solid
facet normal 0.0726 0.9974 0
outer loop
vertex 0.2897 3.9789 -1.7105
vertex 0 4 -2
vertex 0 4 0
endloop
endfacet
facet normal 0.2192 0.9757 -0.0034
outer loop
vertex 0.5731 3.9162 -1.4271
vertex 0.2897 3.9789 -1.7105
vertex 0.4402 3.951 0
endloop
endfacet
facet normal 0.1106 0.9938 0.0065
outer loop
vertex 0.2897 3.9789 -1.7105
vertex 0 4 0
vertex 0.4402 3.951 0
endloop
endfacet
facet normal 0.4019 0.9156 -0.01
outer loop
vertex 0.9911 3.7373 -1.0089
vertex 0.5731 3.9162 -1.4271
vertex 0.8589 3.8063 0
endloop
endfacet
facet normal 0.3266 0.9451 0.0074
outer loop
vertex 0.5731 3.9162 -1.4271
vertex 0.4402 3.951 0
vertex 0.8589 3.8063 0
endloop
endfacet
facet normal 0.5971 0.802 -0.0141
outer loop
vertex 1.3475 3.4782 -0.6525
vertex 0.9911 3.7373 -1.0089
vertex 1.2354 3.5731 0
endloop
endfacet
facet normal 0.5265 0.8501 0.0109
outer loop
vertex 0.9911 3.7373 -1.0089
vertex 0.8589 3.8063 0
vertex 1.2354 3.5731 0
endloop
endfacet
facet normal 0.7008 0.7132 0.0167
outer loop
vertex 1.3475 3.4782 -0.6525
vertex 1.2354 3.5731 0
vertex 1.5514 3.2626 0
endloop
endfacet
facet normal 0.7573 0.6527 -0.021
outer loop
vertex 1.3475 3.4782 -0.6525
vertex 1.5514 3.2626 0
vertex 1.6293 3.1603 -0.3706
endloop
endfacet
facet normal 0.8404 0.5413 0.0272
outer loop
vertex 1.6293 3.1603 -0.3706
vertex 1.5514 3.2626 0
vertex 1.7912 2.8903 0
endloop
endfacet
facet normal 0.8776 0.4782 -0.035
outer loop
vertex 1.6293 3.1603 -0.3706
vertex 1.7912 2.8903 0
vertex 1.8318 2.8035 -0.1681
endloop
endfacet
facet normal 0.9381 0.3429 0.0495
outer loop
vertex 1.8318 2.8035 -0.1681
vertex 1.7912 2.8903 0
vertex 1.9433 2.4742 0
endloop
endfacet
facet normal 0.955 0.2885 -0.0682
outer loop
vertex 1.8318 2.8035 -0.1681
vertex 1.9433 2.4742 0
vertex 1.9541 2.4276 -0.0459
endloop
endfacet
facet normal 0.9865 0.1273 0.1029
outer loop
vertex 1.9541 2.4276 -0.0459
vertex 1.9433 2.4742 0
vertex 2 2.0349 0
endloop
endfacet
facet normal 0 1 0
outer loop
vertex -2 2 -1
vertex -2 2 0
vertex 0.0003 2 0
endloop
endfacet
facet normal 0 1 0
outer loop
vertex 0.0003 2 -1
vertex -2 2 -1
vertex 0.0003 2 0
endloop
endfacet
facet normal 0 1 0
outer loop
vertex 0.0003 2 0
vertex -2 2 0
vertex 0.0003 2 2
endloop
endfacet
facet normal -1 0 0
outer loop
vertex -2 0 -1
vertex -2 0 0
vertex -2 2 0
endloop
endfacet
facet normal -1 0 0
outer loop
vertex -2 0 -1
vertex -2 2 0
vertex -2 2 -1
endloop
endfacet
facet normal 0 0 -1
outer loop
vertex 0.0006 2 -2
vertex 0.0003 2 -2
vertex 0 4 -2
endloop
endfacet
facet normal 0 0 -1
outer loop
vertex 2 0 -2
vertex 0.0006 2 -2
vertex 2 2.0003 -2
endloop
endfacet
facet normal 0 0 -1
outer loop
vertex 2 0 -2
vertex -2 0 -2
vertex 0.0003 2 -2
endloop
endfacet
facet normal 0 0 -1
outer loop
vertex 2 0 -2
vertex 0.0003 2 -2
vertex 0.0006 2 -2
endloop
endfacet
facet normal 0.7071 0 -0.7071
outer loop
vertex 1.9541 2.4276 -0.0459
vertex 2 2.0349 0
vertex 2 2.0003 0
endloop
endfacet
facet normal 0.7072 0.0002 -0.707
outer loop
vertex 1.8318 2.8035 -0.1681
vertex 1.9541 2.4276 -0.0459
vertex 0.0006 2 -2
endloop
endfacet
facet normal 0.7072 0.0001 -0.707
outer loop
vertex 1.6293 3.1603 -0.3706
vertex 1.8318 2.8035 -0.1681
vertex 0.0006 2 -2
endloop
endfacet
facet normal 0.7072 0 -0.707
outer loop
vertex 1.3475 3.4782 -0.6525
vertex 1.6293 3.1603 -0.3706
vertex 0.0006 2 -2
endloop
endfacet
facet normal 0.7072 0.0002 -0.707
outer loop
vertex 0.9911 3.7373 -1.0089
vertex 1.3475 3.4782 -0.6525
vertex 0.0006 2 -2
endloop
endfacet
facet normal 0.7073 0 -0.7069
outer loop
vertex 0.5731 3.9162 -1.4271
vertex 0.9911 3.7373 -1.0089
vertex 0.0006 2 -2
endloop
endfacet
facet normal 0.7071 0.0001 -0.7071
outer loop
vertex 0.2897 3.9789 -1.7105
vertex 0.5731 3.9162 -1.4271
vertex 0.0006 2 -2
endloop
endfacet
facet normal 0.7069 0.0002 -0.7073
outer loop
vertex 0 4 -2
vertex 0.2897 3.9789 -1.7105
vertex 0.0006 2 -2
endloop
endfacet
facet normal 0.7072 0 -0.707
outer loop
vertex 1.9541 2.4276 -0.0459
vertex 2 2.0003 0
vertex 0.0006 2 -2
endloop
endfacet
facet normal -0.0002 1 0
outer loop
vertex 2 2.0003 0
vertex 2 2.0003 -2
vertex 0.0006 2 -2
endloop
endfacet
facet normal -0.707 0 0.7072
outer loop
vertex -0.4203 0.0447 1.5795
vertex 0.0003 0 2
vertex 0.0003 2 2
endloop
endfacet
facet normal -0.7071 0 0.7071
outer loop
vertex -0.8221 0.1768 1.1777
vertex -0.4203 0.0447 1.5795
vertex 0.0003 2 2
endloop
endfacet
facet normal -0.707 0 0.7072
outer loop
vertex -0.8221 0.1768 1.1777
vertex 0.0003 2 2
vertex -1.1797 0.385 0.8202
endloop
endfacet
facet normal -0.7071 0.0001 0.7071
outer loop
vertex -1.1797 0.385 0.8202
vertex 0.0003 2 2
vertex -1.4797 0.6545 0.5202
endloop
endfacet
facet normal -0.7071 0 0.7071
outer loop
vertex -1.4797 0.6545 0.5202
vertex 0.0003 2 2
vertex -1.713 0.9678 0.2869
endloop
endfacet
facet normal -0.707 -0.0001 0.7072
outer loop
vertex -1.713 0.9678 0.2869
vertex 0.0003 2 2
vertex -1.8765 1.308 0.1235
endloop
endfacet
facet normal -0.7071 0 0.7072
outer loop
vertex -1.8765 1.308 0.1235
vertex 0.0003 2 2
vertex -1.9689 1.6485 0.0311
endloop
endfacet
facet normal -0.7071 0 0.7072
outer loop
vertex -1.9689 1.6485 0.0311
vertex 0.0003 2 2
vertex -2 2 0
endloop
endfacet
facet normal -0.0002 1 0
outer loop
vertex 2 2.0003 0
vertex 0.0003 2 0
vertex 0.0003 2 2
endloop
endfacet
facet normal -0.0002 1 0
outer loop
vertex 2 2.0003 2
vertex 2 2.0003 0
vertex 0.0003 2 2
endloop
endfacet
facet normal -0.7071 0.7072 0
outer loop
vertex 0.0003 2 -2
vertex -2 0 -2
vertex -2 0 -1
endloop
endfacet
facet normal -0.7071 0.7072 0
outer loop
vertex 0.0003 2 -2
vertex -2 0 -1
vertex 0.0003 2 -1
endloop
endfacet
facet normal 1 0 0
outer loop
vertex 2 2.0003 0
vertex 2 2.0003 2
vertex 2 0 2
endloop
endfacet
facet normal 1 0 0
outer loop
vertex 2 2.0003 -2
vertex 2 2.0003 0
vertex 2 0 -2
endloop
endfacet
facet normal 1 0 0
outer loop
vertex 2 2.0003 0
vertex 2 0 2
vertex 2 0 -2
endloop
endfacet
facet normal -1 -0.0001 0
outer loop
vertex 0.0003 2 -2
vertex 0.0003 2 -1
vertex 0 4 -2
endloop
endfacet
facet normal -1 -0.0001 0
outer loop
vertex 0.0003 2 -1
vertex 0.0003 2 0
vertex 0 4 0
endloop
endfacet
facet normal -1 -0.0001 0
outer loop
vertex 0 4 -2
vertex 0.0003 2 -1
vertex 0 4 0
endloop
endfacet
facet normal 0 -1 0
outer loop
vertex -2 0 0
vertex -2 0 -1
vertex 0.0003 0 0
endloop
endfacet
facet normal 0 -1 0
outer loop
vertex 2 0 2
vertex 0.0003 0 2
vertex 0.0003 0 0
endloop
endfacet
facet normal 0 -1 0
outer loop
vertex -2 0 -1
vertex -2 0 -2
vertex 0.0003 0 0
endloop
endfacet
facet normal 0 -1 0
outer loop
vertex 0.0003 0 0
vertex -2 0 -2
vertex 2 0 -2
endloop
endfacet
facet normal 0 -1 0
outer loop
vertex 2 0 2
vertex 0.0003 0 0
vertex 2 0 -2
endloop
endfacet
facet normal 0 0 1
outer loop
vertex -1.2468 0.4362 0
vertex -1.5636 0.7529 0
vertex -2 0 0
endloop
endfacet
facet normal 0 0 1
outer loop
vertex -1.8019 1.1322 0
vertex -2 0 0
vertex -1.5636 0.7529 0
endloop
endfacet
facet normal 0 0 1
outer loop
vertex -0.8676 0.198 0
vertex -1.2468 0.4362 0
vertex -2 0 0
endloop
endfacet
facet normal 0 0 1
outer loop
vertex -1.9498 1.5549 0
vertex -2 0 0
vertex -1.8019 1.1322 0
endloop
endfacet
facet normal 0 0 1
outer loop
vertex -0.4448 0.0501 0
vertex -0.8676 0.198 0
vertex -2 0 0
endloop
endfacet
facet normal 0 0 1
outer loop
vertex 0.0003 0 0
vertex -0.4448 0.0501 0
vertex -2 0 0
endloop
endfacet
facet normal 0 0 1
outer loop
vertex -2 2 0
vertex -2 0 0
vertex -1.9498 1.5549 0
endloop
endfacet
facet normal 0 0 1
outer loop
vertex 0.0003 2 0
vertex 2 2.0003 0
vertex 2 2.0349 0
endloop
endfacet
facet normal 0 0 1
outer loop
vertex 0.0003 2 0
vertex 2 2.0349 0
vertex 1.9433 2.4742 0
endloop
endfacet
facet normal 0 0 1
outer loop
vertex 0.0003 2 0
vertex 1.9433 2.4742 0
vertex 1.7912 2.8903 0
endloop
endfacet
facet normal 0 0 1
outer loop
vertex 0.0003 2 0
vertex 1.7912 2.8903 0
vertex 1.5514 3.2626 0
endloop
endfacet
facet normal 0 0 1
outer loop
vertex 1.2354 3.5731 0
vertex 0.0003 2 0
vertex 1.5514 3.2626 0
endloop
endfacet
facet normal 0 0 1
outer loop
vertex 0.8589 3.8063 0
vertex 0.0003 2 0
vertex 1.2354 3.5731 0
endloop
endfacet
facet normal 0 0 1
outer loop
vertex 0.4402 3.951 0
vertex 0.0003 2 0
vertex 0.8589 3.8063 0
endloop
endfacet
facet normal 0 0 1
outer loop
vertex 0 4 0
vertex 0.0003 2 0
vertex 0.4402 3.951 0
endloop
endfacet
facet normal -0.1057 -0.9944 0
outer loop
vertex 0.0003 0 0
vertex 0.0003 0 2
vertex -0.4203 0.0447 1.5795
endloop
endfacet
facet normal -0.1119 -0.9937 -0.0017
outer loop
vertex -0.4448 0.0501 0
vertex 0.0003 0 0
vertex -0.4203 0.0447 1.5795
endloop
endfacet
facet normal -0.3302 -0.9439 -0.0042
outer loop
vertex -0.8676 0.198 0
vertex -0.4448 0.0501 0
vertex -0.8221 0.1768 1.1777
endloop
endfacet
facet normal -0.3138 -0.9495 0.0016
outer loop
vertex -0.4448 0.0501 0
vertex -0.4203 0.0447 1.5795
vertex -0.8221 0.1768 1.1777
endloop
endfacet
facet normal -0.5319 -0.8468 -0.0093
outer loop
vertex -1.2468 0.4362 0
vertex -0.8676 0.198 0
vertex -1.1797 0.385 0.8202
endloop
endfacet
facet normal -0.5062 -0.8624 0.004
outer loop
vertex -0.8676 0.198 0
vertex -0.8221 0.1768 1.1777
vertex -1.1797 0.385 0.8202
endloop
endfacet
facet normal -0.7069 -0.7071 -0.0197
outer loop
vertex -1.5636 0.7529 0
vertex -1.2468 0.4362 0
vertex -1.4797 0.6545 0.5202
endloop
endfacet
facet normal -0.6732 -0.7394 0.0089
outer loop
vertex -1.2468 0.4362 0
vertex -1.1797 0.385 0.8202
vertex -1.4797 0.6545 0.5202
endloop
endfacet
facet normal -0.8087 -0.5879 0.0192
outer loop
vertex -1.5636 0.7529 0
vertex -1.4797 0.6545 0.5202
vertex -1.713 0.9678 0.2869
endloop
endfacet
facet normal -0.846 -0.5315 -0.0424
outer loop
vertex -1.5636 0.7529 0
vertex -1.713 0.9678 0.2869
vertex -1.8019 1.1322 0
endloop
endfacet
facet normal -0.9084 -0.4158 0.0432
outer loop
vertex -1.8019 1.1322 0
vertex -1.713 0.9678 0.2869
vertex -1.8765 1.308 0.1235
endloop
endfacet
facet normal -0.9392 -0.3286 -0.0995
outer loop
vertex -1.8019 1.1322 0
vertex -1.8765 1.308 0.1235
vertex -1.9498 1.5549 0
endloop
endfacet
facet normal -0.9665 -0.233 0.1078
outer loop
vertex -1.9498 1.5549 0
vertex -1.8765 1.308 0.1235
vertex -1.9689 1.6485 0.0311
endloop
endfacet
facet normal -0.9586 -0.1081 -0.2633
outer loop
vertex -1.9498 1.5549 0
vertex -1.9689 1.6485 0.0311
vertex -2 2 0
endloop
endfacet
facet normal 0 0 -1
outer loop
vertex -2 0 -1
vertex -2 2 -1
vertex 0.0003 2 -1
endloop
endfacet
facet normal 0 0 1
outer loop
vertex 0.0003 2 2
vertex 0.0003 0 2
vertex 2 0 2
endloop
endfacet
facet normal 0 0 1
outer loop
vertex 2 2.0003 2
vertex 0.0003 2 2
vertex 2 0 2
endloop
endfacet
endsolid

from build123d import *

# Parameters (mm, degrees)
SKETCH1_W           = 4
SKETCH1_H           = 4
BOSS_EXTRUDE1_DEPTH = 4
CUT_EXTRUDE1_DEPTH  = 4
CUT_EXTRUDE2_DEPTH  = 4
SKETCH4_W           = 2
SKETCH4_H           = 2
CUT_EXTRUDE3_DEPTH  = 4
CUT_EXTRUDE4_DEPTH  = 10
CUT_EXTRUDE5_DEPTH  = 1
CUT_EXTRUDE6_DEPTH  = 2


with BuildPart() as part:
    # Sketch1 → Boss-Extrude1 (new body)
    with BuildSketch(Plane(origin=(0, 0, 0), x_dir=(1, 0, 0), z_dir=(0, 1, 0))):
        Rectangle(SKETCH1_W, SKETCH1_H)
    extrude(amount=BOSS_EXTRUDE1_DEPTH)

    # Sketch2 → Cut-Extrude1 (cut)
    with BuildSketch(Plane.XY.offset(2)):
        Polygon((0.000305194, 2.000000023), (0, 4), (-2, 4), (-2, 2), align=None)
        with BuildLine():
            Line((2, 4), (0, 4))
            ThreePointArc((0, 4), (1.402002953, 3.426619591), (2, 2.034938268))
            Line((2, 2.034938268), (2, 4))
        make_face()
    extrude(amount=-CUT_EXTRUDE1_DEPTH, mode=Mode.SUBTRACT)

    # Sketch3 → Cut-Extrude2 (cut)
    with BuildSketch(Plane(origin=(-2.3e-08, 2.000000023, 0), x_dir=(1, 1.2e-08, 0), z_dir=(-1.2e-08, 1, 0))):
        Polygon((0.00030524, -2), (-1.999999977, 0), (-1.999999977, -2), align=None)
    extrude(amount=-CUT_EXTRUDE2_DEPTH, mode=Mode.SUBTRACT)

    # Sketch4 → Cut-Extrude3 (cut)
    with BuildSketch(Plane(origin=(0.000610387, 9.3e-08, 0), x_dir=(0, 0, 1), z_dir=(-0.999999988, -0.000152597, 0))):
        with Locations((1, 2.999999953)):
            Rectangle(SKETCH4_W, SKETCH4_H)
    extrude(amount=-CUT_EXTRUDE3_DEPTH, mode=Mode.SUBTRACT)

    # Sketch5 → Cut-Extrude4 (cut)
    with BuildSketch(Plane(origin=(-0.000305194, 1.99999993, 0), x_dir=(0.999999988, 0.000152597, 0), z_dir=(-0.000152597, 0.999999988, 0))):
        Polygon((2.000310502, 0), (0.000915581, 2), (2.000310502, 2), align=None)
    extrude(amount=CUT_EXTRUDE4_DEPTH, mode=Mode.SUBTRACT)

    # Sketch6 → Cut-Extrude5 (cut)
    with BuildSketch(Plane(origin=(0, 0, -2), x_dir=(-1, 0, 0), z_dir=(0, 0, -1))):
        Polygon((2, 0), (-0.000305194, 2.000000023), (2, 2.000000012), align=None)
    extrude(amount=-CUT_EXTRUDE5_DEPTH, mode=Mode.SUBTRACT)

    # Sketch7 → Cut-Extrude6 (cut)
    with BuildSketch(Plane.XY.offset(2)):
        with BuildLine():
            Line((-2, 2), (-1.999999977, 0))
            Line((-1.999999977, 0), (0.00030524, 0))
            ThreePointArc((0.00030524, 0), (-1.414105641, 0.585678515), (-2, 2))
        make_face()
    extrude(amount=-CUT_EXTRUDE6_DEPTH, mode=Mode.SUBTRACT)


solid = part.part
